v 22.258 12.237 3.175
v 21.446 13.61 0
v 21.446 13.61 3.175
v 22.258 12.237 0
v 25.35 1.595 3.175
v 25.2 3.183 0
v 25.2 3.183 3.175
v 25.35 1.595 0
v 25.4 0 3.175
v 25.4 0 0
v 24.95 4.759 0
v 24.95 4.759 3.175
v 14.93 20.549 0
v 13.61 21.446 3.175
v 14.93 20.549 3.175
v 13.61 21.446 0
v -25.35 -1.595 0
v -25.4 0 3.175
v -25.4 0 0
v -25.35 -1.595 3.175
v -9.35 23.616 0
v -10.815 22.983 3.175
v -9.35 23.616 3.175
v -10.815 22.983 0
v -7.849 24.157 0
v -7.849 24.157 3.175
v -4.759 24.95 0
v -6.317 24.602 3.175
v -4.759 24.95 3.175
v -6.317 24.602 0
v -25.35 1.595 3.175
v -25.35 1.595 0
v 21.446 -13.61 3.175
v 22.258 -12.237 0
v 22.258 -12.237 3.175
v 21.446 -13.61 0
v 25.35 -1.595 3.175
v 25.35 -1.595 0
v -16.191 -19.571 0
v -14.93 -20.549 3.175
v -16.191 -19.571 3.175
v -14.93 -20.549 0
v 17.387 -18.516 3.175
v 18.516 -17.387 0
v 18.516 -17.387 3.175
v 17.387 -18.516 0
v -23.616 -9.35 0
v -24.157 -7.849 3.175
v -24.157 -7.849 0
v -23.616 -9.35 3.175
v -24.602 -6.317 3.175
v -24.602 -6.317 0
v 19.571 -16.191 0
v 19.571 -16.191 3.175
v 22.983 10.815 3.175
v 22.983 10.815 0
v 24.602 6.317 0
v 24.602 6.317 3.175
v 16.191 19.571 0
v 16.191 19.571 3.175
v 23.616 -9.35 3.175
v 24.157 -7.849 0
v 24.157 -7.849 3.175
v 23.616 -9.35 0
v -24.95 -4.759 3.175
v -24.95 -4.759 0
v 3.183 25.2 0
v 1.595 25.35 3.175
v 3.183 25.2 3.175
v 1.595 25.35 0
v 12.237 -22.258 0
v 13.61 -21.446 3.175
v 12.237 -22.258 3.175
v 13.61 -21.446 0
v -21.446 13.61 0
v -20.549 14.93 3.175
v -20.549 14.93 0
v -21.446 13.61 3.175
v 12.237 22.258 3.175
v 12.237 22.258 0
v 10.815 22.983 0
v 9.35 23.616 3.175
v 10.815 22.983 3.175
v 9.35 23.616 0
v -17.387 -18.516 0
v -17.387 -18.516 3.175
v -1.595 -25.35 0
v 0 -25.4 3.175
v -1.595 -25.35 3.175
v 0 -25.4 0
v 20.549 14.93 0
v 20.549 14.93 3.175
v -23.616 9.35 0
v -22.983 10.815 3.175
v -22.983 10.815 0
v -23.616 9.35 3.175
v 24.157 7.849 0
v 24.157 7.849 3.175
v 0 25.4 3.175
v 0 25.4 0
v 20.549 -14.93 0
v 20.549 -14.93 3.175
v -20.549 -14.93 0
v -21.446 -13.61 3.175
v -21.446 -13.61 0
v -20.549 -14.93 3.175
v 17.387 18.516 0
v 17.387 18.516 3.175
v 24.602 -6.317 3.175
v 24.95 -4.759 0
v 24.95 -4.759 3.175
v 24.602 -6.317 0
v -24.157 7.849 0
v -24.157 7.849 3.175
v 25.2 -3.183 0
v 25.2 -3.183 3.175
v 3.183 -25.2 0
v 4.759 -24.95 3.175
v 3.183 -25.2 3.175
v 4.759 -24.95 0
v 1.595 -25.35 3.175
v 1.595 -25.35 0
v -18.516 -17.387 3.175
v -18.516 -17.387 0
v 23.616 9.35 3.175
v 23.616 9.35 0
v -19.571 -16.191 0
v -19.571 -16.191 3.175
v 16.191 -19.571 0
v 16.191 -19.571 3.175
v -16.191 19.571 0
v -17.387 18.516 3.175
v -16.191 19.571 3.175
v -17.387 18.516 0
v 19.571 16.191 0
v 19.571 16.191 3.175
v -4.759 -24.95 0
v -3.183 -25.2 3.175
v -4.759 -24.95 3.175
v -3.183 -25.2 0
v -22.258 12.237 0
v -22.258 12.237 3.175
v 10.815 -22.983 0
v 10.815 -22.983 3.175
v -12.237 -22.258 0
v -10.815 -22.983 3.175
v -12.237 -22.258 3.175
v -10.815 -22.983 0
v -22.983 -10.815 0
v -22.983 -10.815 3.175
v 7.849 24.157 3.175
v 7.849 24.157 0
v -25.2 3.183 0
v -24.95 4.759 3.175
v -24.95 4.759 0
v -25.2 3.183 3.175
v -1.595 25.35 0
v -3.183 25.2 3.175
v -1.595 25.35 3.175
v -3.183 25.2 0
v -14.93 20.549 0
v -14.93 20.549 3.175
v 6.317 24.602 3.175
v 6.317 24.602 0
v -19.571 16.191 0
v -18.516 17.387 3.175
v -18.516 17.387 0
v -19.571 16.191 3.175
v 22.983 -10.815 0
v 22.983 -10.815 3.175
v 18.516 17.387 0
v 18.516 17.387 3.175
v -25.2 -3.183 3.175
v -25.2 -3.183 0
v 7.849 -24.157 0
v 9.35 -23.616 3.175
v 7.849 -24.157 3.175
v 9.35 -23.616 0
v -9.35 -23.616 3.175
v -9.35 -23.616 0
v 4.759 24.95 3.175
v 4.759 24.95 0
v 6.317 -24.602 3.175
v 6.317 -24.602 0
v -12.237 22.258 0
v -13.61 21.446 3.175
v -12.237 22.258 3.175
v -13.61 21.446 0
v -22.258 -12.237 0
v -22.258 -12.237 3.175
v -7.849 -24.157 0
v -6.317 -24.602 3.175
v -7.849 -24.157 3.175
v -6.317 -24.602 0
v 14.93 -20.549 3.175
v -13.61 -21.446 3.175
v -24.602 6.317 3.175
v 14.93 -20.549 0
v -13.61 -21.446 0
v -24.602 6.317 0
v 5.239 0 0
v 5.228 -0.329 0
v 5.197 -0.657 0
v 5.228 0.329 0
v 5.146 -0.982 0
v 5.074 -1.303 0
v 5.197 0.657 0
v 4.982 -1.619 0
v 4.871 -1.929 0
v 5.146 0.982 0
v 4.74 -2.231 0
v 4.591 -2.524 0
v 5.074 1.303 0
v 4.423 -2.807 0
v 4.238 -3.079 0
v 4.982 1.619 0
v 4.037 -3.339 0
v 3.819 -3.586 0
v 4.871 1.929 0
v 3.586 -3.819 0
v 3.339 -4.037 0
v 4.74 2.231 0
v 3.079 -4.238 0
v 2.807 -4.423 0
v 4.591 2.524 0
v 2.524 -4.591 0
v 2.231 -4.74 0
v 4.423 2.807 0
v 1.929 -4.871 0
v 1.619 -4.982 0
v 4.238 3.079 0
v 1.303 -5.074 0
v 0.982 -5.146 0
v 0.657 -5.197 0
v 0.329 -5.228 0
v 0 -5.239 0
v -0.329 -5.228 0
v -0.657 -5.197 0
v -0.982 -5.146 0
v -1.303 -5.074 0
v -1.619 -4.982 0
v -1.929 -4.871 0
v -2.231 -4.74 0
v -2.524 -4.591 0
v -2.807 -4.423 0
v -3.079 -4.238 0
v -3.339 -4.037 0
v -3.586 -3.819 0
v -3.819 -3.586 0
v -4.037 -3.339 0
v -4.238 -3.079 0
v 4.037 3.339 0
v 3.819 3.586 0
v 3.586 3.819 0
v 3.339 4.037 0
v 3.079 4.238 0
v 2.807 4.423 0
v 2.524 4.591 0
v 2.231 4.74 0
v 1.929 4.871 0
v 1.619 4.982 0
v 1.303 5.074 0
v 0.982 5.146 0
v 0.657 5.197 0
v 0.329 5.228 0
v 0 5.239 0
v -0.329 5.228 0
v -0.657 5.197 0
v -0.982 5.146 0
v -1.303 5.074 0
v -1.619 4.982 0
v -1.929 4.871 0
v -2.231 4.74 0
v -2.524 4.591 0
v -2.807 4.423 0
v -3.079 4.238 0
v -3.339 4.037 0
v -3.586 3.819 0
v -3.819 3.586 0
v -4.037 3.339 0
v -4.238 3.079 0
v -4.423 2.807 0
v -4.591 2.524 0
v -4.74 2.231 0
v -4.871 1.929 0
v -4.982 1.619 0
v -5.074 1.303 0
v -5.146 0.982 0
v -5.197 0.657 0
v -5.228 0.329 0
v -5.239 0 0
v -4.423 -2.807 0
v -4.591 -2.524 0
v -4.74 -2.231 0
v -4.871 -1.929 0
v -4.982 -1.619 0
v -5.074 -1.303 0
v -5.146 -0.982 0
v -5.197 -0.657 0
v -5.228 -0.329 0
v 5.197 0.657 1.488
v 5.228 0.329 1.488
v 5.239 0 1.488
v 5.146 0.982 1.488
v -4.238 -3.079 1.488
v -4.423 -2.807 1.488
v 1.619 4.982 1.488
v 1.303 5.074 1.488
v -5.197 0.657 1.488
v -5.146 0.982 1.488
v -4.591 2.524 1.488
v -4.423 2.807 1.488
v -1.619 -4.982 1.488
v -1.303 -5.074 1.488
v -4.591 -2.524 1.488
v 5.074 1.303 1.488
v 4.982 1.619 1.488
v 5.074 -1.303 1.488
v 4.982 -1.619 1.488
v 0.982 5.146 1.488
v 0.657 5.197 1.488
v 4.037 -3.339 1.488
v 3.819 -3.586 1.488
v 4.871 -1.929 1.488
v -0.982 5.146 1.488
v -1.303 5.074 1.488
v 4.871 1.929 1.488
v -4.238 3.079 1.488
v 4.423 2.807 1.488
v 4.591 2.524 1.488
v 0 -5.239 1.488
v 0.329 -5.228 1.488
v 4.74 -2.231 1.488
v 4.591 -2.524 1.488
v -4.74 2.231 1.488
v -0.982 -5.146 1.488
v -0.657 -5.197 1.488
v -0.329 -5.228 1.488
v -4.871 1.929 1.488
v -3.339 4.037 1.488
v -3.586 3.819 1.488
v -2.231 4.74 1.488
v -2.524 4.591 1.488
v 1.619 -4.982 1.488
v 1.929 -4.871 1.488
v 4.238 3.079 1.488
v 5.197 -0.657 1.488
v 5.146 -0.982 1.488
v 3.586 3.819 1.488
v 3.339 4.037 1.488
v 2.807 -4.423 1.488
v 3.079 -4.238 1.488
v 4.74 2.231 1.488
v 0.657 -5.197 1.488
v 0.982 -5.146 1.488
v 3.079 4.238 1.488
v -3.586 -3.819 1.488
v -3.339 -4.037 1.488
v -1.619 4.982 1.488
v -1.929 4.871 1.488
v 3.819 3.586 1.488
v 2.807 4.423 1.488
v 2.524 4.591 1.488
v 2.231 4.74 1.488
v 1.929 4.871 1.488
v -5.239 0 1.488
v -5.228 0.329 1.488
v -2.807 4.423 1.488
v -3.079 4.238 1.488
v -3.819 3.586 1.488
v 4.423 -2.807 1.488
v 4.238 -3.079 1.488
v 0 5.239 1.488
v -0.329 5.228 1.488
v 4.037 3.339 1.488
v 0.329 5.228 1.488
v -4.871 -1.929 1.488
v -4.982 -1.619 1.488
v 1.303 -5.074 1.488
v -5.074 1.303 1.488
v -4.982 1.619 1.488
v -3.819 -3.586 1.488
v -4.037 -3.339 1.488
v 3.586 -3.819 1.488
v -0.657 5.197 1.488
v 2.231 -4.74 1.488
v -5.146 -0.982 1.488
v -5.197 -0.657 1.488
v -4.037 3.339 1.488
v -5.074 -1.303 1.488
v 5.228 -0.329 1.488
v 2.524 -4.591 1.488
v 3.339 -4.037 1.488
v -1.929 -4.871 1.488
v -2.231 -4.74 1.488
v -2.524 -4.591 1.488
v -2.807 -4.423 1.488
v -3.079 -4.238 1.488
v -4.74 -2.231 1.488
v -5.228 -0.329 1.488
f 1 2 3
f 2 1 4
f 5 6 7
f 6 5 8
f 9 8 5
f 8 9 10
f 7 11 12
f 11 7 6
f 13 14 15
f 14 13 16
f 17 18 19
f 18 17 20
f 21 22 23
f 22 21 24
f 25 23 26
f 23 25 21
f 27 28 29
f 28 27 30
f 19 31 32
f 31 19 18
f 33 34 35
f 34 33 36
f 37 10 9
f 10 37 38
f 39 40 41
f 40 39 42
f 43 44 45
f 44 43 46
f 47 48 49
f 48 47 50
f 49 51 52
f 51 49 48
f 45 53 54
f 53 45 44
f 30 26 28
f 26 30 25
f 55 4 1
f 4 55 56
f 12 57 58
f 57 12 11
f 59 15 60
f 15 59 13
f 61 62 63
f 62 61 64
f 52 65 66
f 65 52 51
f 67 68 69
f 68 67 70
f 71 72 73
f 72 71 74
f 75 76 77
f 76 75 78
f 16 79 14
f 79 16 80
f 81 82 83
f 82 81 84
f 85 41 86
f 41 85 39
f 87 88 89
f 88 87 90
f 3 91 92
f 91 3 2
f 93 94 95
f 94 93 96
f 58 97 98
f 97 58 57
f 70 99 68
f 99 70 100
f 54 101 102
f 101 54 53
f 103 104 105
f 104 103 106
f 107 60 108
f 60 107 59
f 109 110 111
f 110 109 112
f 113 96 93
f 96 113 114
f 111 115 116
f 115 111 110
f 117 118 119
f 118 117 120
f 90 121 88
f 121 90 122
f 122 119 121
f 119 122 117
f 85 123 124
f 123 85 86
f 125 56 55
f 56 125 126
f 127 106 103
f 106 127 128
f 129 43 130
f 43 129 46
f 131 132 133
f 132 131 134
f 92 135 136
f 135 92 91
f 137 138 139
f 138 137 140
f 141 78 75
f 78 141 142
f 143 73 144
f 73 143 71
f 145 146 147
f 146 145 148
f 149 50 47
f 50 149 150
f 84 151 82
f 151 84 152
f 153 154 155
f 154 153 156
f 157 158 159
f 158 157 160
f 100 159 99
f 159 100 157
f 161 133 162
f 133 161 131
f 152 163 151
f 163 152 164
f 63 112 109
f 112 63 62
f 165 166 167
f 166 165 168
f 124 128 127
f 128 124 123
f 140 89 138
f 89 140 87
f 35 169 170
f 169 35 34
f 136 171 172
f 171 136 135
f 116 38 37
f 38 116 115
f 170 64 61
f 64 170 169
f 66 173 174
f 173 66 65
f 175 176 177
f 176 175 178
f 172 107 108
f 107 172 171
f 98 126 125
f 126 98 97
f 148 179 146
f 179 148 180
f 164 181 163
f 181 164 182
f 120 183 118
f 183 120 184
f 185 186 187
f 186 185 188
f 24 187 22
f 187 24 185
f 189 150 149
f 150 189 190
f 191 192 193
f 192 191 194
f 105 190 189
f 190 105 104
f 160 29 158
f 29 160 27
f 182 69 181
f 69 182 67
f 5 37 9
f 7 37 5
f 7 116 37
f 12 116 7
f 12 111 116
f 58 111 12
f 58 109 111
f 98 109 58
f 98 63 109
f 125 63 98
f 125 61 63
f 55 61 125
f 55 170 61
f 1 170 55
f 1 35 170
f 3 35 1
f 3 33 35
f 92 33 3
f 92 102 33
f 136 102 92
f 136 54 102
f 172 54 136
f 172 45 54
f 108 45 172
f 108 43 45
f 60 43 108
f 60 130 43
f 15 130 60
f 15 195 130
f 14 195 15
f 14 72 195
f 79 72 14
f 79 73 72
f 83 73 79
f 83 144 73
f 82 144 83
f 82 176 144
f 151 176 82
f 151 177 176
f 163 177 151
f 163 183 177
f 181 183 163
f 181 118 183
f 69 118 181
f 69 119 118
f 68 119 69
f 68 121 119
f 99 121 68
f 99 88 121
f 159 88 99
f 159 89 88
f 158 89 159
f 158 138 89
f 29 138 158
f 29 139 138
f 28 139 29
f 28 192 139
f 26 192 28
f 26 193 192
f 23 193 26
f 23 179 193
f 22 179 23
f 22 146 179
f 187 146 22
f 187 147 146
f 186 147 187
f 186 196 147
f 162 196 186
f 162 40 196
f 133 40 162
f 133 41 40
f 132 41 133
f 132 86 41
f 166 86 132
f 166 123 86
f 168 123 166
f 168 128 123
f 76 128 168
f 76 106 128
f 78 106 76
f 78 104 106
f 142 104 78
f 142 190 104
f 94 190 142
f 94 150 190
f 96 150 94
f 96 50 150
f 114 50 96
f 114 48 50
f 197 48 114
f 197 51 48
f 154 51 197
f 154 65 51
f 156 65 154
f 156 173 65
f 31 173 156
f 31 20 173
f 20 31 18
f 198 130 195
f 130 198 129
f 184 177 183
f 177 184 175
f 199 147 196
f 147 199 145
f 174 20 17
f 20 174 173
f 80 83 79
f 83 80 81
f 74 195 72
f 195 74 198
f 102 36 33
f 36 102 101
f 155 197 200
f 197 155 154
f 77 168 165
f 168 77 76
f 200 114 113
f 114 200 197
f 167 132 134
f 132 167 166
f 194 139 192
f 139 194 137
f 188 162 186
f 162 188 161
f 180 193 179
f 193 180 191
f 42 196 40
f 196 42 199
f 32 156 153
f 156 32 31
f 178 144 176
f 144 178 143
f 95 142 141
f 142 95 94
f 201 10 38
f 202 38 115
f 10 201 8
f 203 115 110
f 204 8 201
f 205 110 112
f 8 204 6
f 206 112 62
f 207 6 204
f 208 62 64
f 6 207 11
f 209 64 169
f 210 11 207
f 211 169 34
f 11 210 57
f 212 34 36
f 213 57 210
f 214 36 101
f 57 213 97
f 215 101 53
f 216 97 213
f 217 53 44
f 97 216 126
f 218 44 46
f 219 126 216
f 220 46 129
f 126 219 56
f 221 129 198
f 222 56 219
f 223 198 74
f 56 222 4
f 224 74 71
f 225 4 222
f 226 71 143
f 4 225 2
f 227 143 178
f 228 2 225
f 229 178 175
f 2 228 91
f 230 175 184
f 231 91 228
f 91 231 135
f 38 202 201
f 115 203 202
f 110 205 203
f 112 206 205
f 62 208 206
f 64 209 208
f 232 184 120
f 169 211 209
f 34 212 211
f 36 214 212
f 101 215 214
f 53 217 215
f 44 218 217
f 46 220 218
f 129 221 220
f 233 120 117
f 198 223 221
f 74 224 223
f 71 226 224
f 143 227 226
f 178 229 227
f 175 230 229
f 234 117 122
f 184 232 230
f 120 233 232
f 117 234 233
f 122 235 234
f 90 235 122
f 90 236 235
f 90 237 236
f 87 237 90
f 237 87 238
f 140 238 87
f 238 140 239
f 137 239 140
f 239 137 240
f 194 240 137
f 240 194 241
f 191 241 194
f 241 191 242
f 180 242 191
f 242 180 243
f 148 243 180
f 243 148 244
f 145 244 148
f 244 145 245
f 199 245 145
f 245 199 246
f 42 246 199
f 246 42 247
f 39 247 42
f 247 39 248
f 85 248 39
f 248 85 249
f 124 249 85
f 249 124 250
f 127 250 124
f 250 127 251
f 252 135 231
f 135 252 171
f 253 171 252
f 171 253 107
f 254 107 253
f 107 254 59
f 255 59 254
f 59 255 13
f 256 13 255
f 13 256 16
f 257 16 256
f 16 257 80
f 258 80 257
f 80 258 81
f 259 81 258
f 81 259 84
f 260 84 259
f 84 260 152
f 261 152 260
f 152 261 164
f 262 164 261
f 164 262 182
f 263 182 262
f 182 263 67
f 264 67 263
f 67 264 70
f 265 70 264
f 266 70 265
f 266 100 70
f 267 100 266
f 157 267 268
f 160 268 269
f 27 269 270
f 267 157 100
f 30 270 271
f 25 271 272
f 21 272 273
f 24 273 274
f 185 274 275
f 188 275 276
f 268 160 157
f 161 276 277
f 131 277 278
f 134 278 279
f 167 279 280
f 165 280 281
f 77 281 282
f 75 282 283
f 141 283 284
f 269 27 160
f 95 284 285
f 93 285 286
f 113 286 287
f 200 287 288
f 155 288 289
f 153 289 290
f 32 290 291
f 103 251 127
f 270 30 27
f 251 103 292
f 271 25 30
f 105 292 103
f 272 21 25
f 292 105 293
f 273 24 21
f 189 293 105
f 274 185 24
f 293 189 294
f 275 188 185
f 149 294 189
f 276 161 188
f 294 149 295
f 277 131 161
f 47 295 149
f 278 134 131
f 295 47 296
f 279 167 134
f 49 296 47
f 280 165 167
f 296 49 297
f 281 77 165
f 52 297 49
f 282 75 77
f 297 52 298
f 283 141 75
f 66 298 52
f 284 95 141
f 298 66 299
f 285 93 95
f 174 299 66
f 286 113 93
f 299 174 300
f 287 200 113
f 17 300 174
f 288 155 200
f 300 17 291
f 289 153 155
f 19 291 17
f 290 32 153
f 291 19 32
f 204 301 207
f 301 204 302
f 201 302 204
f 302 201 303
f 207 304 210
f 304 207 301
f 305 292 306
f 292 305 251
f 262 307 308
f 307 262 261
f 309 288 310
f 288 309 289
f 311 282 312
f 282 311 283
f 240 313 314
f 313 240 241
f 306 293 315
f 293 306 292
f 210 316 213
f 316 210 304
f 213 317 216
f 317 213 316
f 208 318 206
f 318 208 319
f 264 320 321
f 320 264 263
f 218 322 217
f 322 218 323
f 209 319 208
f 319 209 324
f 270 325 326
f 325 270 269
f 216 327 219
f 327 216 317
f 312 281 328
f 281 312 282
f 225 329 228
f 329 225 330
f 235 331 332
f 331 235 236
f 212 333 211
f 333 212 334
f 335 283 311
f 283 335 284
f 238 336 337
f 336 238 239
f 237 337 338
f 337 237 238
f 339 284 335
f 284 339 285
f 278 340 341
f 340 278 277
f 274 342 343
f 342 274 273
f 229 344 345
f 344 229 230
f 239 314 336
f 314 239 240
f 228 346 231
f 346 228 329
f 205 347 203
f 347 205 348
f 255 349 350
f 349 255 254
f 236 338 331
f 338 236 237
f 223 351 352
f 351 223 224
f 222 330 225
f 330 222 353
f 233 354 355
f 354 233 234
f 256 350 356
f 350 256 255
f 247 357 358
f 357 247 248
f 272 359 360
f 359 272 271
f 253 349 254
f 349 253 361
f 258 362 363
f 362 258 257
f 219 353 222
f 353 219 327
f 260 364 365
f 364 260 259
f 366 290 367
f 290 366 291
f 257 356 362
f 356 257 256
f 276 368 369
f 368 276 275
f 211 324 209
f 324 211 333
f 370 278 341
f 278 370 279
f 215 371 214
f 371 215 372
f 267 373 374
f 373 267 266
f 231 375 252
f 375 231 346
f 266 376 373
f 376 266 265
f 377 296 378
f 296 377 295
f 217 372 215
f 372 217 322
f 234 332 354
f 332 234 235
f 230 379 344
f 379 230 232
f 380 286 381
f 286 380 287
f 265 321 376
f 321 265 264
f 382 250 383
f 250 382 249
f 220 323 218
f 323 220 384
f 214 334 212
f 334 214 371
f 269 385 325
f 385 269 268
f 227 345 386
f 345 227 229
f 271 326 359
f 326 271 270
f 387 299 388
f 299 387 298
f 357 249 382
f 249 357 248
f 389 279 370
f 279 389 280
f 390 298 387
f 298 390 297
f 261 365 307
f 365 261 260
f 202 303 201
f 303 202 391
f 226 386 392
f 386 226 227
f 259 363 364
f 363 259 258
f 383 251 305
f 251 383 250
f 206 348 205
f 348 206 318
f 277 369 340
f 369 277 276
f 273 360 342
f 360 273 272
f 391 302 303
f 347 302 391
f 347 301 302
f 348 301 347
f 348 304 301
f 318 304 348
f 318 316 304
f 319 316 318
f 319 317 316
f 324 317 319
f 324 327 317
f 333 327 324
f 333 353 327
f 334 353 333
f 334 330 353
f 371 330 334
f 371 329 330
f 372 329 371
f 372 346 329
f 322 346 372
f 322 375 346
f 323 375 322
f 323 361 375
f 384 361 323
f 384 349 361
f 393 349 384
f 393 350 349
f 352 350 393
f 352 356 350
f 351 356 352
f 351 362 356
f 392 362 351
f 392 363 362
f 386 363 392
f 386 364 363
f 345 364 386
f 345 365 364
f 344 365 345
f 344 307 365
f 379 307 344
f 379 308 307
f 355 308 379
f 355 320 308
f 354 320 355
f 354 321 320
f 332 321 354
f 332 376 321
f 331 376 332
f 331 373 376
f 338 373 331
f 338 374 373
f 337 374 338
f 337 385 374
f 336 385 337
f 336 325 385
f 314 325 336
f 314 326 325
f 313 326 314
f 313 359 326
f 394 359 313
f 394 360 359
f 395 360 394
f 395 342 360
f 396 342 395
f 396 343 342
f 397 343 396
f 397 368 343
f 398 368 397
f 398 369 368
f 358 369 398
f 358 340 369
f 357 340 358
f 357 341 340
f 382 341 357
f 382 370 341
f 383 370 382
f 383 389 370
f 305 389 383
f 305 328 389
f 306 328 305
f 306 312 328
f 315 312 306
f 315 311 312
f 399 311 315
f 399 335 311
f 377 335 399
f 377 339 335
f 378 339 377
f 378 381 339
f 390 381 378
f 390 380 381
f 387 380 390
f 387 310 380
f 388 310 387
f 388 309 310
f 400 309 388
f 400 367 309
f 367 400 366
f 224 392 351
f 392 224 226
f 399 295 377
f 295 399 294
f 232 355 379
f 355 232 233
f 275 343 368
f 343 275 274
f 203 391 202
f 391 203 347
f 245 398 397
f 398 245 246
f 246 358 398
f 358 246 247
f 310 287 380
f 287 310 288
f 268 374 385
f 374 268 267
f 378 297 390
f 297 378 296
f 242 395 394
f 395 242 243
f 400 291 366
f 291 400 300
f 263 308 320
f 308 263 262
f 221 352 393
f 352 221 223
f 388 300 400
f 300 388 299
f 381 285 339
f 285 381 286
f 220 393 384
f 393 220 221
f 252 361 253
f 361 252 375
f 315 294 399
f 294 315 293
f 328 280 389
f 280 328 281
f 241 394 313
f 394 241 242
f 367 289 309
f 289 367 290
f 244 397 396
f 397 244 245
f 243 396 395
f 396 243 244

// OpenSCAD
inch = 25.4;
$fn = 100;

difference() {
    cylinder(h = inch * 1/8, r = inch * 1);
    cylinder(h = inch * 15/256, r = 1.1 * inch * 3/16);
}
